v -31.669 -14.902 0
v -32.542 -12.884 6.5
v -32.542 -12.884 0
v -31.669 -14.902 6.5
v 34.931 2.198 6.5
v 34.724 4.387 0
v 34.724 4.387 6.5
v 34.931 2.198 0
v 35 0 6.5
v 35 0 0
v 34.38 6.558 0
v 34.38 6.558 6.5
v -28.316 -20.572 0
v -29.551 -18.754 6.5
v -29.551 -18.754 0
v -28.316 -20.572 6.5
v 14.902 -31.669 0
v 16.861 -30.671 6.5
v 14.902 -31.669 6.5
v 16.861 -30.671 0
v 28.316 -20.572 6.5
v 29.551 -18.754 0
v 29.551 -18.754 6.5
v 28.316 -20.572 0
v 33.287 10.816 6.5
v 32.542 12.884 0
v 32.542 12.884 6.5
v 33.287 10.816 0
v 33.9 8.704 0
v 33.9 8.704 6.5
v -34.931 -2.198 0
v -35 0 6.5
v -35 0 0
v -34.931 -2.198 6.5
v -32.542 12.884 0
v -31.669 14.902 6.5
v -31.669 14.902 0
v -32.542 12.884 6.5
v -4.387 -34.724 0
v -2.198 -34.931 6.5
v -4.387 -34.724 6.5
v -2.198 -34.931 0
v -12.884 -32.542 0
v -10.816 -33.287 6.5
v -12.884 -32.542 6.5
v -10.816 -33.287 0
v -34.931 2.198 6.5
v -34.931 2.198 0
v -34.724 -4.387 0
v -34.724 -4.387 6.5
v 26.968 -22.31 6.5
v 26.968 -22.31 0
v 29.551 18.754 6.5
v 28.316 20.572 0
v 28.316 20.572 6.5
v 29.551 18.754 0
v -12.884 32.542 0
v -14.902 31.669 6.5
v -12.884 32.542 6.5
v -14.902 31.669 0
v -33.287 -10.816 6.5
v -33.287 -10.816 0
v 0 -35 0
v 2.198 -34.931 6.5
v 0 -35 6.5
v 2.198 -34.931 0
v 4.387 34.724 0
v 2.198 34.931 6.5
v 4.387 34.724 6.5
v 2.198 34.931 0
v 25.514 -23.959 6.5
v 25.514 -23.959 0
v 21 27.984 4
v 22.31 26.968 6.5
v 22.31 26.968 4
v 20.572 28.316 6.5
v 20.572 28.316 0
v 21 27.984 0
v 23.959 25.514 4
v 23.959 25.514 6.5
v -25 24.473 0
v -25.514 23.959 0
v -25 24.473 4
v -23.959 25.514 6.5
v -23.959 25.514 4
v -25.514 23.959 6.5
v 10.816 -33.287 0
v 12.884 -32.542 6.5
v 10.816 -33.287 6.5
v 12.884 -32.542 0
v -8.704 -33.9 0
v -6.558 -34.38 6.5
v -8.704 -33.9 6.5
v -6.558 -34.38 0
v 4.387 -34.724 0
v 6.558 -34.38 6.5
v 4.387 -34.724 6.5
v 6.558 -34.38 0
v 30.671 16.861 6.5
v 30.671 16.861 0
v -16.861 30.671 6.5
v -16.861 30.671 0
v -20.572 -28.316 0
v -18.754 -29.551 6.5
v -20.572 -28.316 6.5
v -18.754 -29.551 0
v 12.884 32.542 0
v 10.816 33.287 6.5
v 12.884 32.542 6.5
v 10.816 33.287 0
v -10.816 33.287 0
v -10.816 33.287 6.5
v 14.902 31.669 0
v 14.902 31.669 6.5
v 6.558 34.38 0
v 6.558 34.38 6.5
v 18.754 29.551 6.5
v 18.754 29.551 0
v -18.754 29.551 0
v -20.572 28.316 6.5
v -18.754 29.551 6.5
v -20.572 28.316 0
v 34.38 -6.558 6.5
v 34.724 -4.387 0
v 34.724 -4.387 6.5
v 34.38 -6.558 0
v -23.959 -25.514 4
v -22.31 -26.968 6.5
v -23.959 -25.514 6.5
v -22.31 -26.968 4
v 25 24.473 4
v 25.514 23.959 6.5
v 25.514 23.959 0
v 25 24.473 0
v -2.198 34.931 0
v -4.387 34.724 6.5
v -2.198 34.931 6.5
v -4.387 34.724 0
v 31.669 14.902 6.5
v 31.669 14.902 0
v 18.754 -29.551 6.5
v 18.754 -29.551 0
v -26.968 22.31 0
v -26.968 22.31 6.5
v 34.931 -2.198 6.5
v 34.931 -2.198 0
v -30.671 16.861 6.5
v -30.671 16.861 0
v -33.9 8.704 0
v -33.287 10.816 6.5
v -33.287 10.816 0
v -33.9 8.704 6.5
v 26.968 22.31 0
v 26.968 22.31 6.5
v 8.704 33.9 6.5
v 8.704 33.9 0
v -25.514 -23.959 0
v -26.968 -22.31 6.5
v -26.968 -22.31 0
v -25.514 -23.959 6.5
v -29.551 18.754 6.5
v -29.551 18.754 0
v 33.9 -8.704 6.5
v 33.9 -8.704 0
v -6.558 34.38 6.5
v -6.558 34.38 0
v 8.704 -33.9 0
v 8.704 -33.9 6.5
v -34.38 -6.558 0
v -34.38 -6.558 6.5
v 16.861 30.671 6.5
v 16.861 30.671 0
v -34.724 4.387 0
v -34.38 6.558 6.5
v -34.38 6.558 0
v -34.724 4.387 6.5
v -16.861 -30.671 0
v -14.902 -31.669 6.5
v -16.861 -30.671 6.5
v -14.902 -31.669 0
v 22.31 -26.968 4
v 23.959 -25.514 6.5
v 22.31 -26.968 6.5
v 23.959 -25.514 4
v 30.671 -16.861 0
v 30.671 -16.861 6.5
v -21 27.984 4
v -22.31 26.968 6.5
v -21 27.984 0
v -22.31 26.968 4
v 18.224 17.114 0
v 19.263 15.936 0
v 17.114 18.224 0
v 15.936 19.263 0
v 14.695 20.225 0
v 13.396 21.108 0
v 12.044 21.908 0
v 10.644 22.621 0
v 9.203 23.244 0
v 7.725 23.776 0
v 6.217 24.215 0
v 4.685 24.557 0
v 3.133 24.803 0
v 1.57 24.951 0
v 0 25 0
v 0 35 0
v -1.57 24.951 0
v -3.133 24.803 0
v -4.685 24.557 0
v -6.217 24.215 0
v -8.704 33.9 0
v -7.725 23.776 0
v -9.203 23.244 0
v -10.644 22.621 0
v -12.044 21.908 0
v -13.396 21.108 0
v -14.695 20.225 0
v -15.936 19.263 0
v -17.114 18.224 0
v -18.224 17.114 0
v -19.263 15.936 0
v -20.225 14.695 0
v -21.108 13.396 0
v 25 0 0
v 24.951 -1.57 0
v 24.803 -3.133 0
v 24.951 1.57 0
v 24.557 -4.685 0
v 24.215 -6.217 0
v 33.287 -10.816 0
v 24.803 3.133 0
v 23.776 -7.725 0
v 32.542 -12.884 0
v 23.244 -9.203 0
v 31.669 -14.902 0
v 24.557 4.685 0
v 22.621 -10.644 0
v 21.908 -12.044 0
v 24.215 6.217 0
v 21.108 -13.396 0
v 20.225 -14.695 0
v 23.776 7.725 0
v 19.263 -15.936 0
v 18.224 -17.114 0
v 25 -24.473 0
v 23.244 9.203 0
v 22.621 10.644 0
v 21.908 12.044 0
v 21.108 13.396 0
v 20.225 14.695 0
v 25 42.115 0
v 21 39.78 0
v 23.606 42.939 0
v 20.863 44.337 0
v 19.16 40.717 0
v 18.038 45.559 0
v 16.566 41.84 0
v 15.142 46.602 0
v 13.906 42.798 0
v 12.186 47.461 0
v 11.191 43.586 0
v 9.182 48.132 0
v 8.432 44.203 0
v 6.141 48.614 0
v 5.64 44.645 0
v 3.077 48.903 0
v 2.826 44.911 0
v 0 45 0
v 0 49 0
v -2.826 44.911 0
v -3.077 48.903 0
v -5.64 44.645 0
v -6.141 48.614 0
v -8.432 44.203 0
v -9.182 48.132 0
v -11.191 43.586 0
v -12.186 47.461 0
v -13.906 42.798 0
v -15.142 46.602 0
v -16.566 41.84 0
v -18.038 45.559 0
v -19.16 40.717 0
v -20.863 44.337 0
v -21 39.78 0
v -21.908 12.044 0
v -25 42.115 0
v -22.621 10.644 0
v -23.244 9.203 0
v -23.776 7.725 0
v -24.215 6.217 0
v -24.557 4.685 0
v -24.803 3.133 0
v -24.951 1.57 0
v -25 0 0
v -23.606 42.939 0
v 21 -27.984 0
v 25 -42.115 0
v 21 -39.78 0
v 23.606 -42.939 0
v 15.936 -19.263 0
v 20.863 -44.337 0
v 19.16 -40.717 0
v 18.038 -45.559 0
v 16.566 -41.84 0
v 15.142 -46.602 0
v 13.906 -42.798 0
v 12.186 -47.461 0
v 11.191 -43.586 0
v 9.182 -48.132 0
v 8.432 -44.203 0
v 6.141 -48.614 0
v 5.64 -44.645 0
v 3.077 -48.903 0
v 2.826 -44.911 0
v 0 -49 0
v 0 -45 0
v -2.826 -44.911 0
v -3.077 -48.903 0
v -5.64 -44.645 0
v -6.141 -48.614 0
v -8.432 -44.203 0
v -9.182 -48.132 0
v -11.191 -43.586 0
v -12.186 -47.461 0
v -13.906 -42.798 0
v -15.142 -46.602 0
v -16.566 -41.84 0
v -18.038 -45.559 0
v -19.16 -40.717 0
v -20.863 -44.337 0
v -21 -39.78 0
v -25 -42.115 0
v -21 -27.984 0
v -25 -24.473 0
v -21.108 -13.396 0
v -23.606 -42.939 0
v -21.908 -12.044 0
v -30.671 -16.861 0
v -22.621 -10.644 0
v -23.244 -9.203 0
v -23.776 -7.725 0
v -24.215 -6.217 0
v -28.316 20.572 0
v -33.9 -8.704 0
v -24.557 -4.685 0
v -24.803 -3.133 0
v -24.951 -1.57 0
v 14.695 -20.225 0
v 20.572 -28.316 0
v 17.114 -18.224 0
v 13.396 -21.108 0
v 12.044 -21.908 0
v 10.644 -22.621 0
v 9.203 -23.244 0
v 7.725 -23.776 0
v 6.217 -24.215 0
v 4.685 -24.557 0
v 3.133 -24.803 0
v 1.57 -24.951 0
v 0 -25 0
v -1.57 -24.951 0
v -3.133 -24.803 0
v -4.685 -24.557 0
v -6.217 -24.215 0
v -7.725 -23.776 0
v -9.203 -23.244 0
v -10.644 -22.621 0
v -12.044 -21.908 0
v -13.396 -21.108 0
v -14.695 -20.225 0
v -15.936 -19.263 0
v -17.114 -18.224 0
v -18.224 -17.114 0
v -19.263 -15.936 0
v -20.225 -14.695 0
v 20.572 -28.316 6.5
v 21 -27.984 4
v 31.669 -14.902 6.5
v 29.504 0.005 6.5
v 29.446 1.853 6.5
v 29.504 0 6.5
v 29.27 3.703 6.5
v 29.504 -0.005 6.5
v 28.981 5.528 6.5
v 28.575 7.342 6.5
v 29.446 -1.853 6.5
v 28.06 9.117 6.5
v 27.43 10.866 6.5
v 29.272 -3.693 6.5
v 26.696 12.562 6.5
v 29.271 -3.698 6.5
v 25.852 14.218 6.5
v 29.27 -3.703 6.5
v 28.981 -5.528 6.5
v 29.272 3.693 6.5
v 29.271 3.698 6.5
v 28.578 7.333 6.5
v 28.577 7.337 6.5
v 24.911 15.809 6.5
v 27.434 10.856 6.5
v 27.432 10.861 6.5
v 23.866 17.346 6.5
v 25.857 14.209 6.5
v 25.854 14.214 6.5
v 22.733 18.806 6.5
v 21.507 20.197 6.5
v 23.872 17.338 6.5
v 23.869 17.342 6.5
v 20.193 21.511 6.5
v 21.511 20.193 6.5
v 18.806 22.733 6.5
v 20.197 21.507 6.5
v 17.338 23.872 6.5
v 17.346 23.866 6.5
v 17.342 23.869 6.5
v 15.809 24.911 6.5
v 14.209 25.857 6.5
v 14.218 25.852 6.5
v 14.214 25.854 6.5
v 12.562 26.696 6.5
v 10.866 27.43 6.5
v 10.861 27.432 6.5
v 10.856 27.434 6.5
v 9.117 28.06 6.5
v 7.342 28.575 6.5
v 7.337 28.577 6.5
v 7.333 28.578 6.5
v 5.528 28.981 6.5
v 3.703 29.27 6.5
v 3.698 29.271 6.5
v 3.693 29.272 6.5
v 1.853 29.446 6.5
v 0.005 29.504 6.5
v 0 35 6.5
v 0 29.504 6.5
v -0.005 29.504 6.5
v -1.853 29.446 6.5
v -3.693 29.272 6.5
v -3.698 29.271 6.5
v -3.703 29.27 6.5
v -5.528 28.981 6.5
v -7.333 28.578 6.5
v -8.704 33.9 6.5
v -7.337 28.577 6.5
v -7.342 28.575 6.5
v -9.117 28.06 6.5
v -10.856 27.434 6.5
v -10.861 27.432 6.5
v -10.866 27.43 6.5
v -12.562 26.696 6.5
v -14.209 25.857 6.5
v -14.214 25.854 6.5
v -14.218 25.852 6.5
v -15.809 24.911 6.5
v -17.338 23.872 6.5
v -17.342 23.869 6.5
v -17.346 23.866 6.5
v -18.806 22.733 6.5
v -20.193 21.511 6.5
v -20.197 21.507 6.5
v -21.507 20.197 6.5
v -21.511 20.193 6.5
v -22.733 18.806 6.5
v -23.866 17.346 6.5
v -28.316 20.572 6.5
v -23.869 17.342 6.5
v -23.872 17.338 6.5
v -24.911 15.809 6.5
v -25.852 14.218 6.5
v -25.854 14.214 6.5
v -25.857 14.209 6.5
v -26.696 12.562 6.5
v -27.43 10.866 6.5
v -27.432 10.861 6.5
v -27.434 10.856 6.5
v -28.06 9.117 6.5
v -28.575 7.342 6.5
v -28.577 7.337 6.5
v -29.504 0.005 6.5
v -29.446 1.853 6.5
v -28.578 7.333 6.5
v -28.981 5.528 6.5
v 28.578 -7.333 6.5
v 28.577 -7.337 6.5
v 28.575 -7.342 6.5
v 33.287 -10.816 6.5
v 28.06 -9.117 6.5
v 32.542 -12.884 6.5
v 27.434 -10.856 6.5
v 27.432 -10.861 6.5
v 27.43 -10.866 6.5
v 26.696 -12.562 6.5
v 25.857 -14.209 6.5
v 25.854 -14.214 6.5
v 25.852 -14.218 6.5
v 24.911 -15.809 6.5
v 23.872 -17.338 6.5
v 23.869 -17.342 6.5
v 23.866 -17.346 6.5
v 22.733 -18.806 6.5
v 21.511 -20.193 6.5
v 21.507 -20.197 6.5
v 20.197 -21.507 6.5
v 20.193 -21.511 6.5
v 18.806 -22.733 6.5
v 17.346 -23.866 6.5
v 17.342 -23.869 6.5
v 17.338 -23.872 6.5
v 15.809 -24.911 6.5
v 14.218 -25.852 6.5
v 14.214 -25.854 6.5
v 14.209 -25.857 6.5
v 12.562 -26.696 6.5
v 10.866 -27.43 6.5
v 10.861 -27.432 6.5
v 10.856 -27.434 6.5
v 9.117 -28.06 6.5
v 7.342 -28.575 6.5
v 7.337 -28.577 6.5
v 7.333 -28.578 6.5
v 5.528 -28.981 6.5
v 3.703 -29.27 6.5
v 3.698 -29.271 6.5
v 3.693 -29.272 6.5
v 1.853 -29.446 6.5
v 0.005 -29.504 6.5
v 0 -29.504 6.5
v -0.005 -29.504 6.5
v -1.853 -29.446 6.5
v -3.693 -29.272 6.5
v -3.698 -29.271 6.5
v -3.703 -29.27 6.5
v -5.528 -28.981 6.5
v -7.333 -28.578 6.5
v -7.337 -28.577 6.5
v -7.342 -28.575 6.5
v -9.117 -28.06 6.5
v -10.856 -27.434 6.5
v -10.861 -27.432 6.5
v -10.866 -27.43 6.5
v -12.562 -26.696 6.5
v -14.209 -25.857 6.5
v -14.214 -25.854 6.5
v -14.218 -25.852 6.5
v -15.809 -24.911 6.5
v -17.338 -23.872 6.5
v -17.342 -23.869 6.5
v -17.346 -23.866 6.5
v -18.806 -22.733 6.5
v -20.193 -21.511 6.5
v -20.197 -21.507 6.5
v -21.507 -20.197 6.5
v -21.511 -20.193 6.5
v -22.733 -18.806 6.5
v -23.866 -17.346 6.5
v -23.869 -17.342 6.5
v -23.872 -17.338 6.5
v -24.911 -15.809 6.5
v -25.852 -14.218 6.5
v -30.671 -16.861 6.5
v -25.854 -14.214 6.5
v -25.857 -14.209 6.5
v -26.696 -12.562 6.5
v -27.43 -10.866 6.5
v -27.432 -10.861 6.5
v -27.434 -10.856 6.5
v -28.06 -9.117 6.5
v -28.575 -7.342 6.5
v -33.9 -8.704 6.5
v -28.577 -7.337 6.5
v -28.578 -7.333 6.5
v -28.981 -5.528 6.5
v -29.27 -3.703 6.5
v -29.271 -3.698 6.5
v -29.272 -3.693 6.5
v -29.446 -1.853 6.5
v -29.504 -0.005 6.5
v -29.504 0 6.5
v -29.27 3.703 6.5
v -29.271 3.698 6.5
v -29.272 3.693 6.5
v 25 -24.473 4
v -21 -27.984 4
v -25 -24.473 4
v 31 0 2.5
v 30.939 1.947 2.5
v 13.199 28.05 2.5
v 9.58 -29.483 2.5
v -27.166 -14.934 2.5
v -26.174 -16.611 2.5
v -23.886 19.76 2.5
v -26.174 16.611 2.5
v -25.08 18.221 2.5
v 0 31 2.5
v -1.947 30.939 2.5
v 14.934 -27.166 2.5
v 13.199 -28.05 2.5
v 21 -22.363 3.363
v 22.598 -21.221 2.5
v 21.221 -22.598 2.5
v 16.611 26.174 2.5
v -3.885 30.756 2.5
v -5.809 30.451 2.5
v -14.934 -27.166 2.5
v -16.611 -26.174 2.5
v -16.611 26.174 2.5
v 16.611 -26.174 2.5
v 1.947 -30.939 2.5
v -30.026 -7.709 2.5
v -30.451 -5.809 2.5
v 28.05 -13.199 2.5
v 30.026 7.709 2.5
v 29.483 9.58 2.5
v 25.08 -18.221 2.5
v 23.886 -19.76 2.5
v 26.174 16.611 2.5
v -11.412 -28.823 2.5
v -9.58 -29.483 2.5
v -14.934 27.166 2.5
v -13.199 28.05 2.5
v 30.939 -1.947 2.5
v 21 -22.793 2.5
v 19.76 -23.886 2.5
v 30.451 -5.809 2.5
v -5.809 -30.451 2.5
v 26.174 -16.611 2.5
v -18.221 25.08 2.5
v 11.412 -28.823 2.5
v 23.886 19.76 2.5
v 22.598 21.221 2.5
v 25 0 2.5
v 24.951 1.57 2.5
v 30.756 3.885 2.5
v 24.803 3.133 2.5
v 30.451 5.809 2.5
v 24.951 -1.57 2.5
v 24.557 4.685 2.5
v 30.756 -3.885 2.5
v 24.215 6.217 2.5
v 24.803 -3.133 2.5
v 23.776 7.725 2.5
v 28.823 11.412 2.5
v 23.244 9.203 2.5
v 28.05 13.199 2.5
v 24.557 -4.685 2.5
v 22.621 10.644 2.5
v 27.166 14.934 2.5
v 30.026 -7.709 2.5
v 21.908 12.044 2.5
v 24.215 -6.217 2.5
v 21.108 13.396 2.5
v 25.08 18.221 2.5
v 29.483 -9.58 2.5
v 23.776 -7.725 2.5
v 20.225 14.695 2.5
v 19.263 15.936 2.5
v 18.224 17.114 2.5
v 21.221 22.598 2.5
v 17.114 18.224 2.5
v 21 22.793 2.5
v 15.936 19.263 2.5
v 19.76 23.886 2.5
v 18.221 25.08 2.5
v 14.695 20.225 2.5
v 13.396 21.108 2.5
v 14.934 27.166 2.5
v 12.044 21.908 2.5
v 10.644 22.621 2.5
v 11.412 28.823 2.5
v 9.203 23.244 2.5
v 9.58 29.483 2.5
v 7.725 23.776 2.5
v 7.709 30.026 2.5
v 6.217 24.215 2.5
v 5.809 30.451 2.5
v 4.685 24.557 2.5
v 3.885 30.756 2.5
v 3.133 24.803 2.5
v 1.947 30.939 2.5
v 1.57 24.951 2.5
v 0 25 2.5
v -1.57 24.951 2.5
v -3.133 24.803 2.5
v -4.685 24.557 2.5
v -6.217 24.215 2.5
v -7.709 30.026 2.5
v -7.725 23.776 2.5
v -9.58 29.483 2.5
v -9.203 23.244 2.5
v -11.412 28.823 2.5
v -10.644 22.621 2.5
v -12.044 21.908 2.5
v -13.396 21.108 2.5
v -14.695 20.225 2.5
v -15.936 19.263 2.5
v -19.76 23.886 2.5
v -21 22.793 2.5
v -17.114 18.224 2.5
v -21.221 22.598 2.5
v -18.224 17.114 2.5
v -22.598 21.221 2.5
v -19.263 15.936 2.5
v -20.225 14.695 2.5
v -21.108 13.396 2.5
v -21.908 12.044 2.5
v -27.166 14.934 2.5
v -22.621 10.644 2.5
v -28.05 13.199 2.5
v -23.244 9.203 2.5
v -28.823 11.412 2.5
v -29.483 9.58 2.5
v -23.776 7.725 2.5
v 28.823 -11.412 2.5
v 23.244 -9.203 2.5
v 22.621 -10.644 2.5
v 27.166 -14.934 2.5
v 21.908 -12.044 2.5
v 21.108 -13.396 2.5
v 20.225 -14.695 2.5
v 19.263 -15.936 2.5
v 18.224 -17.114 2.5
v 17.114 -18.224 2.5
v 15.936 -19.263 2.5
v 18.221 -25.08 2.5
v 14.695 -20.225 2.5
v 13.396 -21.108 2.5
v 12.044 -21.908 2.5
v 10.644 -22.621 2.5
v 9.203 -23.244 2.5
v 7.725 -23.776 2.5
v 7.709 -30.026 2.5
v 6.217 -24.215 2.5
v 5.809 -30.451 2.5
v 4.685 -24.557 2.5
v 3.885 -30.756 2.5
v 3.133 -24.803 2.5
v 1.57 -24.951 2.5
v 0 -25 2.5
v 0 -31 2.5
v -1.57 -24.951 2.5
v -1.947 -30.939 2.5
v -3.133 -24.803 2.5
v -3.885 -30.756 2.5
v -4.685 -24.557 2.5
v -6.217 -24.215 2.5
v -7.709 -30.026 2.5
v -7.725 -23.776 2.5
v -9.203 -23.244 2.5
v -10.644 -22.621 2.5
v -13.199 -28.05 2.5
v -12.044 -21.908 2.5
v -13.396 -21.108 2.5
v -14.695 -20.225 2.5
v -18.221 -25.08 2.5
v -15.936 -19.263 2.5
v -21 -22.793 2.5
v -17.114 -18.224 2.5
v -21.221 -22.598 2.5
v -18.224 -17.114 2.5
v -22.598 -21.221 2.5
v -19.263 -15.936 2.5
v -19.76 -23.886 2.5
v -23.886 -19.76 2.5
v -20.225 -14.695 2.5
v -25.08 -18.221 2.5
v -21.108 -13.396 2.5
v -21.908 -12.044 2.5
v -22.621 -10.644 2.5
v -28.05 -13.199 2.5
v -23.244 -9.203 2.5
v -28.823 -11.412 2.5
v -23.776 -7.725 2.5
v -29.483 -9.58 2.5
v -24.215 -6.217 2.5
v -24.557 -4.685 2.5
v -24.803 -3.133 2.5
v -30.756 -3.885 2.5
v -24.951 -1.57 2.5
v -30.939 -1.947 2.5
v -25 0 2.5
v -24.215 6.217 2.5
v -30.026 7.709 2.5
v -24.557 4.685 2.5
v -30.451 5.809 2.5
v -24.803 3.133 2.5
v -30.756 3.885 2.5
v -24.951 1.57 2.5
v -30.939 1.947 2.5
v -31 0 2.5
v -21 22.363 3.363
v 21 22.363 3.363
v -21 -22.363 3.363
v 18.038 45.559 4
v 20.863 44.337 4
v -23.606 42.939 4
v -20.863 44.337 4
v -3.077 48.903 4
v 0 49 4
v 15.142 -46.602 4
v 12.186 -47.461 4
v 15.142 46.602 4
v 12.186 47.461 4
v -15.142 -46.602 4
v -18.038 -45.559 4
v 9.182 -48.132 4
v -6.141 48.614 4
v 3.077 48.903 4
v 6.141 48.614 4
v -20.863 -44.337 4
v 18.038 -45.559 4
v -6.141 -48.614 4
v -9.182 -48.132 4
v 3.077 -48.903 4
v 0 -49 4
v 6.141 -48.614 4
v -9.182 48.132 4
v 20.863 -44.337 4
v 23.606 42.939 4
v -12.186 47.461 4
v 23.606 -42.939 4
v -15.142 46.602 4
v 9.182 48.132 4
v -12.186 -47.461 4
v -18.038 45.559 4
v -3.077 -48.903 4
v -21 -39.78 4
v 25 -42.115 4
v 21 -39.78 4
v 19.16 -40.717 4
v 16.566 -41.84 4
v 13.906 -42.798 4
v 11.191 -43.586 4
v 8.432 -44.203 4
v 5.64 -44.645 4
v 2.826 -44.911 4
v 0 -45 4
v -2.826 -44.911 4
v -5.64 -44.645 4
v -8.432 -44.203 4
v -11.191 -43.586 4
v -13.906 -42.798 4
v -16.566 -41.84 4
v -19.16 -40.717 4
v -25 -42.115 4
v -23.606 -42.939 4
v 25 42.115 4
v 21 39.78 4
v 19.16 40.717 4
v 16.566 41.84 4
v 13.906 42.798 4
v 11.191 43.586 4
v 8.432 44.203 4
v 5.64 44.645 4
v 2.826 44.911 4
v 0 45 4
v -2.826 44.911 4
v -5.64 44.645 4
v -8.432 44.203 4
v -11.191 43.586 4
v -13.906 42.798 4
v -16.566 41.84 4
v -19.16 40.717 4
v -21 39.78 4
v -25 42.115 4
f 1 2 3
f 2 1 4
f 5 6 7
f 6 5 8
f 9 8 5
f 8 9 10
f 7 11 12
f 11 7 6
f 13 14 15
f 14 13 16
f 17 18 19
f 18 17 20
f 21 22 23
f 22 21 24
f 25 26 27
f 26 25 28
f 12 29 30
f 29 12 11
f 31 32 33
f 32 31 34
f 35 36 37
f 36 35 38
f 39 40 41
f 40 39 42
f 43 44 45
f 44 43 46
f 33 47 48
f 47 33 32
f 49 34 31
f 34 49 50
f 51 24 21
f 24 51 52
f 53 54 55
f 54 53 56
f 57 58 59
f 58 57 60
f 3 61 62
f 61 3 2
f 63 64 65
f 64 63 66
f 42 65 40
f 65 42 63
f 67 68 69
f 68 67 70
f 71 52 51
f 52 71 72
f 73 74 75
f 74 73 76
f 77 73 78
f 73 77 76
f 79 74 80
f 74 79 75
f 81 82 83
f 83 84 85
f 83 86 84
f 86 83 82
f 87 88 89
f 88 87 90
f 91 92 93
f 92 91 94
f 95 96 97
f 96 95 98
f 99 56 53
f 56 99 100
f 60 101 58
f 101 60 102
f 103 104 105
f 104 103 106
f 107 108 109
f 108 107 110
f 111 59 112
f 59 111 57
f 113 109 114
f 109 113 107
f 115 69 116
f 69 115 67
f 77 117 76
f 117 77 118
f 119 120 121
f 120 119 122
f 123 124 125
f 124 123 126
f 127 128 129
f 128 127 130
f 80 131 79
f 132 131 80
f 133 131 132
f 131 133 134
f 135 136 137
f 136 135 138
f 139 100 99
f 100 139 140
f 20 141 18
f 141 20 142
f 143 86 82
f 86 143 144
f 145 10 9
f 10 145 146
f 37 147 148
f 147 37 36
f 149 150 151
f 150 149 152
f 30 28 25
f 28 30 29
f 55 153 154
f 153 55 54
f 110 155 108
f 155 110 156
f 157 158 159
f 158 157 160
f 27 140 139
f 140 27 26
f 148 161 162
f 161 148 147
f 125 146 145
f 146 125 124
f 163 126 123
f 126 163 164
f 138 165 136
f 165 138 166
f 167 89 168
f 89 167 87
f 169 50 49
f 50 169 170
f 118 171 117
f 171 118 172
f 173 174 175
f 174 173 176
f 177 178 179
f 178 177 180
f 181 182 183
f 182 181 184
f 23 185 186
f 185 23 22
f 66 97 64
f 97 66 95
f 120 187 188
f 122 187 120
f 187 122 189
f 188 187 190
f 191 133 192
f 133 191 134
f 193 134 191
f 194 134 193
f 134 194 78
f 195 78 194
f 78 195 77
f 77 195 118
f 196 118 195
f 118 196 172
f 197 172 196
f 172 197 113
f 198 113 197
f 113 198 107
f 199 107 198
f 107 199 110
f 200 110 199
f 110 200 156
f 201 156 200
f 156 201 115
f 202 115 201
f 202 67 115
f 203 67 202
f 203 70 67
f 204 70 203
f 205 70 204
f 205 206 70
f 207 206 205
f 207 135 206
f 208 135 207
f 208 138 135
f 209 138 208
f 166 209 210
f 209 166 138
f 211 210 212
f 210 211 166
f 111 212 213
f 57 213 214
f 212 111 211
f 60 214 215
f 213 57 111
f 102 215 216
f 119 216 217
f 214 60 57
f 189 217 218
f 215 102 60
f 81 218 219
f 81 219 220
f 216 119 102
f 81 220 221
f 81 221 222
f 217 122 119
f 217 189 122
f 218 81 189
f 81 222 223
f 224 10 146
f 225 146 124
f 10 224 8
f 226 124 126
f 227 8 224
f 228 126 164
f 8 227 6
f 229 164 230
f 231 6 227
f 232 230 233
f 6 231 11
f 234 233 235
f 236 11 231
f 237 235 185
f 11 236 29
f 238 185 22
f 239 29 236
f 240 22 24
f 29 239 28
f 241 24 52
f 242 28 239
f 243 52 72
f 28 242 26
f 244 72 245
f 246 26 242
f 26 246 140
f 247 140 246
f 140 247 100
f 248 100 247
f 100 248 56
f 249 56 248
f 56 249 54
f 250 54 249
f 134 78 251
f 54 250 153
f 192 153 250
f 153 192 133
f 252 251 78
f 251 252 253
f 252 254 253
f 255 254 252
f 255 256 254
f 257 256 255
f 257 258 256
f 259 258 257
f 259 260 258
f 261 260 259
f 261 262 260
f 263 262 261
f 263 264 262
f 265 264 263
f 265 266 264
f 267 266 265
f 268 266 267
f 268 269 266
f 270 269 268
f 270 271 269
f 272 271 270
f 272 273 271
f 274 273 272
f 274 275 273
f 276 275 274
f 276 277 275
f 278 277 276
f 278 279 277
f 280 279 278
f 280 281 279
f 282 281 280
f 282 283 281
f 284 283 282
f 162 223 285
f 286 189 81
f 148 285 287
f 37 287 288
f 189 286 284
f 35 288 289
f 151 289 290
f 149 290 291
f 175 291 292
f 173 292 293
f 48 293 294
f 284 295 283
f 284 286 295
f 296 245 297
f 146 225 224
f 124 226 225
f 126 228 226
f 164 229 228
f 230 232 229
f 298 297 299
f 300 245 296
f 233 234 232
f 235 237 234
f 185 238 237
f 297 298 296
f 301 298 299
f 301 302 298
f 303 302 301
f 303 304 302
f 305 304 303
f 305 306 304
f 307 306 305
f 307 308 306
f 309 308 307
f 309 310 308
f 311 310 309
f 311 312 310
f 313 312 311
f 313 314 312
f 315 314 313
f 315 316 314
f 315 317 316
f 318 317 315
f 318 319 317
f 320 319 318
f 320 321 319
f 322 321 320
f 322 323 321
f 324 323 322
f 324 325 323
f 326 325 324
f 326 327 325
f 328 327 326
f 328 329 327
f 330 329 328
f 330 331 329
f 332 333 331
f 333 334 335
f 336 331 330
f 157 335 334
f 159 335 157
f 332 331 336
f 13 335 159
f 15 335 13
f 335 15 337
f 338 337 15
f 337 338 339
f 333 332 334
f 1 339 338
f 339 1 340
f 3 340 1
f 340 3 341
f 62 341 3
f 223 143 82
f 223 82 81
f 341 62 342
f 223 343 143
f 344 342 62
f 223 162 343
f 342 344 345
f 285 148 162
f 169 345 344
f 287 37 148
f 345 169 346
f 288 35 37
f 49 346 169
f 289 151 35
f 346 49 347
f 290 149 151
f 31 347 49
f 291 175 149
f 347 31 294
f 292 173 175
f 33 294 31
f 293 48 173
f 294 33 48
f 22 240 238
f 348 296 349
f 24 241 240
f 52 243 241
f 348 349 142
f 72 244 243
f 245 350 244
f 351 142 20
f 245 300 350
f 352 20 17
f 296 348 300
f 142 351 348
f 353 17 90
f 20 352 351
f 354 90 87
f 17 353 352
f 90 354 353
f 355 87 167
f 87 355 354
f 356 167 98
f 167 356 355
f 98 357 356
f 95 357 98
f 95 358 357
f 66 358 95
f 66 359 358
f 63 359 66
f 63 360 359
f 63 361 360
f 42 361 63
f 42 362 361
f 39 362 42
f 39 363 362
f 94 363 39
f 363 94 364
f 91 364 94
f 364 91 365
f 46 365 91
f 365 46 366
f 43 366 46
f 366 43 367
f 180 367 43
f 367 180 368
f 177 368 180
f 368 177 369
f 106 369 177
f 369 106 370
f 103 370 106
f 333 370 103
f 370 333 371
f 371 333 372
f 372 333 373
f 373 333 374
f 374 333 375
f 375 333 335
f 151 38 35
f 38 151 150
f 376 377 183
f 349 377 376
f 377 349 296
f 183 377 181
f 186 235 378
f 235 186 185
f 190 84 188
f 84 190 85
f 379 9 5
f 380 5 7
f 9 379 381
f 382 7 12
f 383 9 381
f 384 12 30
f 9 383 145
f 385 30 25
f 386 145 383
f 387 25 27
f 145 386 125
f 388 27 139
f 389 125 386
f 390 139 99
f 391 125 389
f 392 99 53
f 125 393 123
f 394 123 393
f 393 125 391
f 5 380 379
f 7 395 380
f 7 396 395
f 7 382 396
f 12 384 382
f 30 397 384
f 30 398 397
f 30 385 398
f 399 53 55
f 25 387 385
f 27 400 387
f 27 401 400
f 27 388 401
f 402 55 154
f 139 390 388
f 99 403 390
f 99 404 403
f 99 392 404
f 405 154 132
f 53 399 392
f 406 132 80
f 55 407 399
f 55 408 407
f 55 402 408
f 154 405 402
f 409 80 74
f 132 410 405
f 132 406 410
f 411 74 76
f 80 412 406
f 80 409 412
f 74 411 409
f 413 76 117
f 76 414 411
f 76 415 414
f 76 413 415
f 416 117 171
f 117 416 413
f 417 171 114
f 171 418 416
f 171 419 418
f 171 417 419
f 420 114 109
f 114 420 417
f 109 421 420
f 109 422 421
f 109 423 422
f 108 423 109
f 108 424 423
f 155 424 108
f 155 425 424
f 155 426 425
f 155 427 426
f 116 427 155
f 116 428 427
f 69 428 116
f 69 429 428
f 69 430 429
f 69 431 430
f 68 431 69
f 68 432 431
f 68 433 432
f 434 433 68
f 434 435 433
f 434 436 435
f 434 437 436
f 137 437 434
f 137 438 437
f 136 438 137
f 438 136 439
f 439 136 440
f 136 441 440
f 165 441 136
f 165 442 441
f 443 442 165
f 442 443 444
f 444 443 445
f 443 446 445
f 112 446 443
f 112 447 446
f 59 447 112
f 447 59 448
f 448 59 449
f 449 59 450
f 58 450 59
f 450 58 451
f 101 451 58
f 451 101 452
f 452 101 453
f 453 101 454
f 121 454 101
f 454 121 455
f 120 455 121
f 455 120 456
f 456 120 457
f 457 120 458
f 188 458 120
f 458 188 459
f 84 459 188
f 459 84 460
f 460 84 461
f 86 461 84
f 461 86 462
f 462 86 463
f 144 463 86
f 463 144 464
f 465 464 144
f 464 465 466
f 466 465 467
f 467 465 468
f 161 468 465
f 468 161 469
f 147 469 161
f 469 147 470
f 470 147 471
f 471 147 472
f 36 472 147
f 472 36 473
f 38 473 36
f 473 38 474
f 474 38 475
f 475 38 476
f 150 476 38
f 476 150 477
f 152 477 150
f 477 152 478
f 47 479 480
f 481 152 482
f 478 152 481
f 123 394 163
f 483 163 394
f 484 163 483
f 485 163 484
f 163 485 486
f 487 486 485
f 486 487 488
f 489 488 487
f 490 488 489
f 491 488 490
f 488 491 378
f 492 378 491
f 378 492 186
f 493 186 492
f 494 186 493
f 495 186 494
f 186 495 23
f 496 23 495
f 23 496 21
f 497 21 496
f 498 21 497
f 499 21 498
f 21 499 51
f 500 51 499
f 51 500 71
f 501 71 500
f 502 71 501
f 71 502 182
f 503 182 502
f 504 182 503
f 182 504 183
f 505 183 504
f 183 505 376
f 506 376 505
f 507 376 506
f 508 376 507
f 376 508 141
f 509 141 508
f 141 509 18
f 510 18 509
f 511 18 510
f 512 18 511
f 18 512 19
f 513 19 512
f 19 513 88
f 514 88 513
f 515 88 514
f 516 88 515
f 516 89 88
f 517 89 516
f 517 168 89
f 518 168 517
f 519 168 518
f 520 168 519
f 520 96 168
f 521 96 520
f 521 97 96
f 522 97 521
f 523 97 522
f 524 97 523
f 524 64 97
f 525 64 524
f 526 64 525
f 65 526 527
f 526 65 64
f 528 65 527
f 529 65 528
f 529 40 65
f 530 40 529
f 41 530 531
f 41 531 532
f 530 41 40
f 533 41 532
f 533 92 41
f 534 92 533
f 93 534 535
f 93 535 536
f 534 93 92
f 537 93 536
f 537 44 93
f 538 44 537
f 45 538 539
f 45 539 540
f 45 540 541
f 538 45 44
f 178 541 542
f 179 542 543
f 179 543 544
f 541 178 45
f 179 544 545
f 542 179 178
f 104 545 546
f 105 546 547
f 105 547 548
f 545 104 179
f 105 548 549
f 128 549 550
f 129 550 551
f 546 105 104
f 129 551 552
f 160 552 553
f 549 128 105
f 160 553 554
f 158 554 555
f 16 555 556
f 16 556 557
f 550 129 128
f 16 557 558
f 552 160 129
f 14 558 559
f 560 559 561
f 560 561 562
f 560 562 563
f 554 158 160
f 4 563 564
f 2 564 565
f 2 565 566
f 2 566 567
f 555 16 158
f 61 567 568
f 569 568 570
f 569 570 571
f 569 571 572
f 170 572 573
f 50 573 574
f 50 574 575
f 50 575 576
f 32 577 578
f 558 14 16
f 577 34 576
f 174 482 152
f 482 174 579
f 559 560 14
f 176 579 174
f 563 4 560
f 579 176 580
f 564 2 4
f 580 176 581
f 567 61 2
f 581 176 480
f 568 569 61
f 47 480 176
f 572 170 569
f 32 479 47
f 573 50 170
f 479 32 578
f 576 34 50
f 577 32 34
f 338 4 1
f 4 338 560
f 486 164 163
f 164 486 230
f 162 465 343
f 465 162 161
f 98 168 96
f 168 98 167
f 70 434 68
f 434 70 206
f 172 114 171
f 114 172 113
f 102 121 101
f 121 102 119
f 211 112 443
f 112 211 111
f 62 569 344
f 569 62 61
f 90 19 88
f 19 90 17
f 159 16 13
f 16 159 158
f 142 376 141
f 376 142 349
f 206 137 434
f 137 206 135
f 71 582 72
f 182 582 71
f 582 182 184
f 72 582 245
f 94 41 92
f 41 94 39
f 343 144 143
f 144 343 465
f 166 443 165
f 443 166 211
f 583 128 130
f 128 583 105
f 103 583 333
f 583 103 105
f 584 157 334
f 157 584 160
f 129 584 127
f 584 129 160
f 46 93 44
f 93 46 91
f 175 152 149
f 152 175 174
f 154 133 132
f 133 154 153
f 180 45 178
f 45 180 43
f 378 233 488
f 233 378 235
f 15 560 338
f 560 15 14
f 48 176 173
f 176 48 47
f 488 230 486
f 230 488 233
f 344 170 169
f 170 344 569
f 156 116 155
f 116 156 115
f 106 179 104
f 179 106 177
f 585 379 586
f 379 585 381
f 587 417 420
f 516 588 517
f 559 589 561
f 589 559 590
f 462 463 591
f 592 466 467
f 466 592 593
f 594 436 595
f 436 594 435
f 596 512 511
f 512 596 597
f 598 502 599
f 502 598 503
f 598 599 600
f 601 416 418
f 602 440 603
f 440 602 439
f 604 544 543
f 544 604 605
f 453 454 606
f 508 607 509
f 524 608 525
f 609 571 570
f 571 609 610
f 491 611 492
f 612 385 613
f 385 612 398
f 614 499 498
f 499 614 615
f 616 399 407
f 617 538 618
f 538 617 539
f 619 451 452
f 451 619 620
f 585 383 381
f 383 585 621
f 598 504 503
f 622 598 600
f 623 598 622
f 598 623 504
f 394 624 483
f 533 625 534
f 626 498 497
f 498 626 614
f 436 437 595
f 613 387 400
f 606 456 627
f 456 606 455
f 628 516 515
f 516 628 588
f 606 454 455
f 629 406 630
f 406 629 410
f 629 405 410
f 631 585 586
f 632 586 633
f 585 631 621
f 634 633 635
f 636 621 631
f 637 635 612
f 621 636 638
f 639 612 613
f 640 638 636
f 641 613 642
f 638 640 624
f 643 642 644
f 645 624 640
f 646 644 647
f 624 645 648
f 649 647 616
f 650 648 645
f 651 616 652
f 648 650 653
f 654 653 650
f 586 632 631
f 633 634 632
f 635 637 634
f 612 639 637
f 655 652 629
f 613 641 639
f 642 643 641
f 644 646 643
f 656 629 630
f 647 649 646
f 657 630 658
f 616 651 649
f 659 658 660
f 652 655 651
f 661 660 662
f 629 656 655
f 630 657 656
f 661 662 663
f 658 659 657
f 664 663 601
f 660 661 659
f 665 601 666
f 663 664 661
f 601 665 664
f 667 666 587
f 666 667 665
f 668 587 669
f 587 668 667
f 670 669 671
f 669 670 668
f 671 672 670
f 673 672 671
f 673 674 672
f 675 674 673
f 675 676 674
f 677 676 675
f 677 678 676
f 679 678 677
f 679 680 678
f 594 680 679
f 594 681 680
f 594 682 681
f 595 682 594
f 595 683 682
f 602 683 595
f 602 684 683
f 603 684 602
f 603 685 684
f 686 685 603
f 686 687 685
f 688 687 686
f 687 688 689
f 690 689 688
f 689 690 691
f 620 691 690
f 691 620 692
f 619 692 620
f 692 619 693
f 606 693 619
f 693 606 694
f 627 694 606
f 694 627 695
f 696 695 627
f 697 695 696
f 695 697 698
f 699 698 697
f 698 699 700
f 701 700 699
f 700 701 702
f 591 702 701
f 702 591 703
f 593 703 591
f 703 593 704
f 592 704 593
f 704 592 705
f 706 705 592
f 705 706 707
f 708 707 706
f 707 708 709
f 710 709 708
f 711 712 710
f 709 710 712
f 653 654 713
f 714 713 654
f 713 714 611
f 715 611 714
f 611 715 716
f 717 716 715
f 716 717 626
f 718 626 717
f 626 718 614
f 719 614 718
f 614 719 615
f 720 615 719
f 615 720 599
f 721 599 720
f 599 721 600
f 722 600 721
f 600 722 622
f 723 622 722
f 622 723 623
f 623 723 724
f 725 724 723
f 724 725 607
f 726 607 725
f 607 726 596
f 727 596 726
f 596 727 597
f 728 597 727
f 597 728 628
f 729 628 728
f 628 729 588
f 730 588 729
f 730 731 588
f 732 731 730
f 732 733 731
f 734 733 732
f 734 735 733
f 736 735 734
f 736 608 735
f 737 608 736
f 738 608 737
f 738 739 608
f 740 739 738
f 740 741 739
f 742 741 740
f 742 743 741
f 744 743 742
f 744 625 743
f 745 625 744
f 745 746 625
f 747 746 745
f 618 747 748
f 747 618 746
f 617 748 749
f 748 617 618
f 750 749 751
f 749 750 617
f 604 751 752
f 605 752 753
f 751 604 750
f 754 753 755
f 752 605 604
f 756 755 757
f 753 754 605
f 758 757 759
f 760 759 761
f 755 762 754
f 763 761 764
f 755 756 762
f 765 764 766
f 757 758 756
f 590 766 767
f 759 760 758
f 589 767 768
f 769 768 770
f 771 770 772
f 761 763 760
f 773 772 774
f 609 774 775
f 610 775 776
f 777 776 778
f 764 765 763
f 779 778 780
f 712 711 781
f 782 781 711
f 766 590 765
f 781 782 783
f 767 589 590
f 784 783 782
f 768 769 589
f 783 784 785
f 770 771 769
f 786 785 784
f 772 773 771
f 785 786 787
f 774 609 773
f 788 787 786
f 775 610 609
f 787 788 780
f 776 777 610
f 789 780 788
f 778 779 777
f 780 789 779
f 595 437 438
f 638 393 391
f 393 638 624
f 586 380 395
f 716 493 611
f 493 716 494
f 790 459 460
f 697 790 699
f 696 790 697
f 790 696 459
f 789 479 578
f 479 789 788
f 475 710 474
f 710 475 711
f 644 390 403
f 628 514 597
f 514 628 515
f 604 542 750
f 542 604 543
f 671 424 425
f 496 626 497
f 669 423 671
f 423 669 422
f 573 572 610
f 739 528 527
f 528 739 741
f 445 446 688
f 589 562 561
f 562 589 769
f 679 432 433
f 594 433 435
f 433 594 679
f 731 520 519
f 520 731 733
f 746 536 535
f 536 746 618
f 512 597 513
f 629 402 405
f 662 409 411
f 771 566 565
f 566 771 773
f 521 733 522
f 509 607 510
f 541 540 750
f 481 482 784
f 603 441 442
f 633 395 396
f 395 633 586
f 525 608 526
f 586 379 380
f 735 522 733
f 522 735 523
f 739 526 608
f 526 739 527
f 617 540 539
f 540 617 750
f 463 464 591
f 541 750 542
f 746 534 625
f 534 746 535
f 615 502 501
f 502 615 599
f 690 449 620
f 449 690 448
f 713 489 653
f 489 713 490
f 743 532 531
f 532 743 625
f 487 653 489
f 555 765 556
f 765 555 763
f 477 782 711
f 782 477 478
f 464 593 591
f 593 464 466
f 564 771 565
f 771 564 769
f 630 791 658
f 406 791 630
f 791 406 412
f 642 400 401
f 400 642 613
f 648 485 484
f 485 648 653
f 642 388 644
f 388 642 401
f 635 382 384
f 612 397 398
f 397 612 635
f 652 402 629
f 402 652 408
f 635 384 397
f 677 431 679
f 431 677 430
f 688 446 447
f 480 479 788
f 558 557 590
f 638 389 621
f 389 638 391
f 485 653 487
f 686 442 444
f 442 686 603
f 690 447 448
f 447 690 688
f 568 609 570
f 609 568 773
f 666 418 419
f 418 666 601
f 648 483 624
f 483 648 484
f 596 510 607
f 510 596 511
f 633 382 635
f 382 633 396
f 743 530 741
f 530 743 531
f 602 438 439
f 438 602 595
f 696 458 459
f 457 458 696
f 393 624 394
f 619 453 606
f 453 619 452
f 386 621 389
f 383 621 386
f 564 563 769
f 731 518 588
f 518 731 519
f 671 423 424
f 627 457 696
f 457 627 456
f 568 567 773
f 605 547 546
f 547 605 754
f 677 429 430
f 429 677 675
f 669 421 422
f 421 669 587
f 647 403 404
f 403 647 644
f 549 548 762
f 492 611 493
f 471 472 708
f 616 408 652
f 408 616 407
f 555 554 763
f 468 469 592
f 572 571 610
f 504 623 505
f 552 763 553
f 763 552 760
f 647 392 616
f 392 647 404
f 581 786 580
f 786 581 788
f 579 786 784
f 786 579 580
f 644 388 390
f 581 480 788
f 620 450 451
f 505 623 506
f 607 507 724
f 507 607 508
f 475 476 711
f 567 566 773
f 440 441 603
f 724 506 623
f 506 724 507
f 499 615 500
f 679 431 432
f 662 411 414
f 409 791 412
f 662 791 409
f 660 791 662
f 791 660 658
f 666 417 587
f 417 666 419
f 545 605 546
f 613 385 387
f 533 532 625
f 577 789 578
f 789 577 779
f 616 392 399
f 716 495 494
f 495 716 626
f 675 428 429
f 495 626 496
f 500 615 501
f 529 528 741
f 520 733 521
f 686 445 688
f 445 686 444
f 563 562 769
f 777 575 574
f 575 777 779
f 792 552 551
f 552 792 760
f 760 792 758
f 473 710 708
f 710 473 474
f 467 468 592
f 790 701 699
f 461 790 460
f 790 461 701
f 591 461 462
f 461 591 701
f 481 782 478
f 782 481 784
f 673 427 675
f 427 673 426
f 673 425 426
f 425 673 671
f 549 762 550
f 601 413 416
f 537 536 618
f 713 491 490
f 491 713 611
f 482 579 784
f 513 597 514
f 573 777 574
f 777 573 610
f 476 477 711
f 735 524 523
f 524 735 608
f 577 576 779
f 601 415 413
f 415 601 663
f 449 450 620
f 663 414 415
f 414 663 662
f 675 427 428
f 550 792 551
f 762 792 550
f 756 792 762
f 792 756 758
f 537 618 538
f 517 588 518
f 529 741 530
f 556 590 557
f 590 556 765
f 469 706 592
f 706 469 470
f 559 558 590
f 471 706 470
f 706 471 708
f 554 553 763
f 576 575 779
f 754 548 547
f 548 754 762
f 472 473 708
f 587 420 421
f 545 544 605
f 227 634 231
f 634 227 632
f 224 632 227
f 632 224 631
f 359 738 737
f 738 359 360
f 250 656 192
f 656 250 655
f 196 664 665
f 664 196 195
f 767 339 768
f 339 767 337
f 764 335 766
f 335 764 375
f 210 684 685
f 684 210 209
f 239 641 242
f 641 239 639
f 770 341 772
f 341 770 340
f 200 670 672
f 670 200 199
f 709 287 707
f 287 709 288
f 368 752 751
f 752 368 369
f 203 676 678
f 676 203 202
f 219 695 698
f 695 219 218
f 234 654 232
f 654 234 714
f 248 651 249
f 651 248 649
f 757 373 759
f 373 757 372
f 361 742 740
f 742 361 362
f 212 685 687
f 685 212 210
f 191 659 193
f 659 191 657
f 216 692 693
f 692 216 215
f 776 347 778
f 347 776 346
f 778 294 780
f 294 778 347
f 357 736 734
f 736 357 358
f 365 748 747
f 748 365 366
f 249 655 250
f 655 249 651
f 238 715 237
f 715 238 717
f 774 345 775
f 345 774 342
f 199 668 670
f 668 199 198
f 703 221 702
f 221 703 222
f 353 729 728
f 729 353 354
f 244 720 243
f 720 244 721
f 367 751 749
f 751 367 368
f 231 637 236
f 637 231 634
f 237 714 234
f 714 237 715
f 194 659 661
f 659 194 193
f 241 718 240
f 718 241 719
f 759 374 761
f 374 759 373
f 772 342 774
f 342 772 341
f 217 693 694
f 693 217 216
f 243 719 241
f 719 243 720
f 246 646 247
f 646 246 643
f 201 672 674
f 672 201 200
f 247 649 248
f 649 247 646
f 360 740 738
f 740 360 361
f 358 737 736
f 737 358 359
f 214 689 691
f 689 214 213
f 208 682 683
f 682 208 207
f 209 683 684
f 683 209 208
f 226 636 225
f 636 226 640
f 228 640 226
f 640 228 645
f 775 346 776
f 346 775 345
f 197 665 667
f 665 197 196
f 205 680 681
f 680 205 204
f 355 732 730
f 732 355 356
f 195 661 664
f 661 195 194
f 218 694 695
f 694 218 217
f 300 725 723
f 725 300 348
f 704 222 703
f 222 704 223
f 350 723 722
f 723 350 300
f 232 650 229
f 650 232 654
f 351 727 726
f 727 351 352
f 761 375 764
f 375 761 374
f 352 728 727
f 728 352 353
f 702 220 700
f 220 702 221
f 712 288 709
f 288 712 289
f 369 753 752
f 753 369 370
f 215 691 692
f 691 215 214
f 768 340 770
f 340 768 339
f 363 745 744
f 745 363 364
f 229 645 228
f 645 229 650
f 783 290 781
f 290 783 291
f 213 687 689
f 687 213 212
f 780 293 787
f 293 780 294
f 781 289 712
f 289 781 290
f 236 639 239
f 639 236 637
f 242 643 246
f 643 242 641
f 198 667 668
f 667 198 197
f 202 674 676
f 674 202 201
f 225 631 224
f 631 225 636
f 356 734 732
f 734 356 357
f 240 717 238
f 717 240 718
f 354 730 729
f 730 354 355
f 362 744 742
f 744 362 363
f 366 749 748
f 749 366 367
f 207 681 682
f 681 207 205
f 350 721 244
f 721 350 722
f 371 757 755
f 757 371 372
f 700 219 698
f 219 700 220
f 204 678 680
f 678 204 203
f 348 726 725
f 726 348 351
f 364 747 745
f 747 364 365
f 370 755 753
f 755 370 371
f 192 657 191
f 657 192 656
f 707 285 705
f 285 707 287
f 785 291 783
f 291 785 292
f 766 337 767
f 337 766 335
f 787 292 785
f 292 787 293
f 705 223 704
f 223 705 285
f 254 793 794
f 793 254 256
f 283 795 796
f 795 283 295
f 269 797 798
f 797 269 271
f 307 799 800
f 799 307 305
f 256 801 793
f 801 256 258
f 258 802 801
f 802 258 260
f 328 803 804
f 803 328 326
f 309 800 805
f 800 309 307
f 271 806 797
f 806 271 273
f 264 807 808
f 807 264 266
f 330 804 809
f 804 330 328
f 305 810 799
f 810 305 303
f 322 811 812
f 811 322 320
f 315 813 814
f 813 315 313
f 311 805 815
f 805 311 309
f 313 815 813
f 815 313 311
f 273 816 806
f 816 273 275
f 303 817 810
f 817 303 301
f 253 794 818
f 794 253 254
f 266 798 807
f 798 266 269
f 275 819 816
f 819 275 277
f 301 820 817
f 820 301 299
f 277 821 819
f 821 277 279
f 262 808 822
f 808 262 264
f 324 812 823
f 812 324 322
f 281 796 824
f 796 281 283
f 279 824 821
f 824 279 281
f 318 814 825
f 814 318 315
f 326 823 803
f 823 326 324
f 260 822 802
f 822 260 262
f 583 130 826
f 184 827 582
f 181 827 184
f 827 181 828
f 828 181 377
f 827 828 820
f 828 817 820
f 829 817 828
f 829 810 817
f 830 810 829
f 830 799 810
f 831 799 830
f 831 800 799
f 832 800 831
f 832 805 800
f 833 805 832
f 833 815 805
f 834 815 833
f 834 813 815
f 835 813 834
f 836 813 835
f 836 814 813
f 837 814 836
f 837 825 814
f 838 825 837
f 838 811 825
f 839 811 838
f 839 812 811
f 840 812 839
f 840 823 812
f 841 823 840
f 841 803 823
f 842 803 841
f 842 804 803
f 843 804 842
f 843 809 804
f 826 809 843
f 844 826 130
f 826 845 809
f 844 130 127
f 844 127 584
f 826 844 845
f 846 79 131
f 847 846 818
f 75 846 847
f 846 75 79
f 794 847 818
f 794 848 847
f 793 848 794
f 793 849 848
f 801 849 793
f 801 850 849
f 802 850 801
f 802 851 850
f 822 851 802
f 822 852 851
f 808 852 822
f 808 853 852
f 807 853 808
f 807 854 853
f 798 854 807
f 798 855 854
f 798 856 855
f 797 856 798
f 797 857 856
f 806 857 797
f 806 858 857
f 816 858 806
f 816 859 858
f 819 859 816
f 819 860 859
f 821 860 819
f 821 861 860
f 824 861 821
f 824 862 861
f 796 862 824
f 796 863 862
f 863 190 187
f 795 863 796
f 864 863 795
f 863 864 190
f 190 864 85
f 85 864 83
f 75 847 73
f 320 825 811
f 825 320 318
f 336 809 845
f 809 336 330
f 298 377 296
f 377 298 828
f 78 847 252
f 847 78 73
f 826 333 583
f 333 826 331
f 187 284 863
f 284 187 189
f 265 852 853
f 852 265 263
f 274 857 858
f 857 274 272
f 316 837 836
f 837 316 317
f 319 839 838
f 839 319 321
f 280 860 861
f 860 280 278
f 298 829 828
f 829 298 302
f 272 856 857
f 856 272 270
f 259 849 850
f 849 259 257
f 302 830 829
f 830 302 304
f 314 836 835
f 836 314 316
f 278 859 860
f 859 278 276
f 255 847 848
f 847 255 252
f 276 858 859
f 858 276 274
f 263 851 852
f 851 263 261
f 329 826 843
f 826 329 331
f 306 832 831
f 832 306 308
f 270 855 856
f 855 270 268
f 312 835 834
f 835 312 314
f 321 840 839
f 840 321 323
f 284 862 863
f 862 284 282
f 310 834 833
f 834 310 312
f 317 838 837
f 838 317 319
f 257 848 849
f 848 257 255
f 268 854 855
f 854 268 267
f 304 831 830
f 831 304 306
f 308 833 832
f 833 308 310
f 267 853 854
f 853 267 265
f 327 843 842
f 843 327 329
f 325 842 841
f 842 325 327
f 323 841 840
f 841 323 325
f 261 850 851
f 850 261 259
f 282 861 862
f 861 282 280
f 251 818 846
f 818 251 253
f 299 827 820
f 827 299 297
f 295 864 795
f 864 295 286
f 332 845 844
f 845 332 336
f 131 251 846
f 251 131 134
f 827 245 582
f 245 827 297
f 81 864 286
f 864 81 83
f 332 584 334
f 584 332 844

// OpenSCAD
//CUSTOMIZER VARIABLES

//Facet number
definition = 100; // [0:400]

//Height of the lens cap holder
baseheight = 6.5;

//Amount of plastic around the lens cap
basewidth = 6;

//Width of the hole in the base of the lens cap holder
basehole = 50;

//Width of your lens cap
capwidth = 58;

//Width to be added to the bottom of the lens cap hole, creates an angle (useful for making sure the cap holds)
captilt = 1.5;

//Height of the cutout for the lens cap
capheight = 4;

//tolerance setting for the lens cap hole (1-2mm should be enough for most printers)
captolerance = 1;

//Gap between the strap holder and the base of the cap holder
beltlength = 10;

//Width of your camera's neck strap
beltwidth = 42;

//Height of the strap holder
beltheight = 4;

//Thickness of the strap holder
beltthickness = 4;

$fn = definition;

difference(){

	cylinder(baseheight,basewidth+capwidth/2,basewidth+capwidth/2);

	translate([0,0,baseheight-capheight])cylinder(capheight+0.01,capwidth/2+captolerance/2+captilt,capwidth/2+captolerance/2);

	translate([0,0,-0.5])cylinder(baseheight-capheight+1,basehole/2,basehole/2);

};

difference(){
	
	intersection(){
		
		cylinder(beltheight,beltlength+basewidth+capwidth/2+beltthickness,beltlength+basewidth+capwidth/2+beltthickness);
		
		translate([-beltwidth/2,-(beltlength*2+basewidth*2+capwidth+beltthickness*2+5)/2,-0.5])cube([beltwidth,beltlength*2+basewidth*2+capwidth+beltthickness*2+5,beltheight+1]);
		
	};
	
	translate([0,0,baseheight-capheight])cylinder(capheight+0.01,capwidth/2+captolerance/2+captilt,capwidth/2+captolerance/2);

	translate([0,0,-0.5])cylinder(baseheight-capheight+1,basehole/2,basehole/2);
	
	translate([0,0,-0.5])cylinder(beltheight+1,beltlength+basewidth+capwidth/2,beltlength+basewidth+capwidth/2);
	
};

difference(){
	
	intersection(){
		
		cylinder(beltheight,beltlength+basewidth+capwidth/2+beltthickness,beltlength+basewidth+capwidth/2+beltthickness);
		
		translate([-(beltwidth/2+beltthickness),-(beltlength*2+basewidth*2+capwidth+beltthickness*2+5)/2,-0.5])cube([beltwidth+beltthickness*2,beltlength*2+basewidth*2+capwidth+beltthickness*2+5,beltheight+1]);
		
	};
	
	translate([-beltwidth/2,-(beltlength*2+basewidth*2+capwidth+beltthickness*2+5)/2,-0.5])cube([beltwidth,beltlength*2+basewidth*2+capwidth+beltthickness*2+5,beltheight+1]);
	
	translate([0,0,baseheight-capheight])cylinder(capheight+0.01,capwidth/2+captolerance/2+captilt,capwidth/2+captolerance/2);

	translate([0,0,-0.5])cylinder(baseheight-capheight+1,basehole/2,basehole/2);
	
};
